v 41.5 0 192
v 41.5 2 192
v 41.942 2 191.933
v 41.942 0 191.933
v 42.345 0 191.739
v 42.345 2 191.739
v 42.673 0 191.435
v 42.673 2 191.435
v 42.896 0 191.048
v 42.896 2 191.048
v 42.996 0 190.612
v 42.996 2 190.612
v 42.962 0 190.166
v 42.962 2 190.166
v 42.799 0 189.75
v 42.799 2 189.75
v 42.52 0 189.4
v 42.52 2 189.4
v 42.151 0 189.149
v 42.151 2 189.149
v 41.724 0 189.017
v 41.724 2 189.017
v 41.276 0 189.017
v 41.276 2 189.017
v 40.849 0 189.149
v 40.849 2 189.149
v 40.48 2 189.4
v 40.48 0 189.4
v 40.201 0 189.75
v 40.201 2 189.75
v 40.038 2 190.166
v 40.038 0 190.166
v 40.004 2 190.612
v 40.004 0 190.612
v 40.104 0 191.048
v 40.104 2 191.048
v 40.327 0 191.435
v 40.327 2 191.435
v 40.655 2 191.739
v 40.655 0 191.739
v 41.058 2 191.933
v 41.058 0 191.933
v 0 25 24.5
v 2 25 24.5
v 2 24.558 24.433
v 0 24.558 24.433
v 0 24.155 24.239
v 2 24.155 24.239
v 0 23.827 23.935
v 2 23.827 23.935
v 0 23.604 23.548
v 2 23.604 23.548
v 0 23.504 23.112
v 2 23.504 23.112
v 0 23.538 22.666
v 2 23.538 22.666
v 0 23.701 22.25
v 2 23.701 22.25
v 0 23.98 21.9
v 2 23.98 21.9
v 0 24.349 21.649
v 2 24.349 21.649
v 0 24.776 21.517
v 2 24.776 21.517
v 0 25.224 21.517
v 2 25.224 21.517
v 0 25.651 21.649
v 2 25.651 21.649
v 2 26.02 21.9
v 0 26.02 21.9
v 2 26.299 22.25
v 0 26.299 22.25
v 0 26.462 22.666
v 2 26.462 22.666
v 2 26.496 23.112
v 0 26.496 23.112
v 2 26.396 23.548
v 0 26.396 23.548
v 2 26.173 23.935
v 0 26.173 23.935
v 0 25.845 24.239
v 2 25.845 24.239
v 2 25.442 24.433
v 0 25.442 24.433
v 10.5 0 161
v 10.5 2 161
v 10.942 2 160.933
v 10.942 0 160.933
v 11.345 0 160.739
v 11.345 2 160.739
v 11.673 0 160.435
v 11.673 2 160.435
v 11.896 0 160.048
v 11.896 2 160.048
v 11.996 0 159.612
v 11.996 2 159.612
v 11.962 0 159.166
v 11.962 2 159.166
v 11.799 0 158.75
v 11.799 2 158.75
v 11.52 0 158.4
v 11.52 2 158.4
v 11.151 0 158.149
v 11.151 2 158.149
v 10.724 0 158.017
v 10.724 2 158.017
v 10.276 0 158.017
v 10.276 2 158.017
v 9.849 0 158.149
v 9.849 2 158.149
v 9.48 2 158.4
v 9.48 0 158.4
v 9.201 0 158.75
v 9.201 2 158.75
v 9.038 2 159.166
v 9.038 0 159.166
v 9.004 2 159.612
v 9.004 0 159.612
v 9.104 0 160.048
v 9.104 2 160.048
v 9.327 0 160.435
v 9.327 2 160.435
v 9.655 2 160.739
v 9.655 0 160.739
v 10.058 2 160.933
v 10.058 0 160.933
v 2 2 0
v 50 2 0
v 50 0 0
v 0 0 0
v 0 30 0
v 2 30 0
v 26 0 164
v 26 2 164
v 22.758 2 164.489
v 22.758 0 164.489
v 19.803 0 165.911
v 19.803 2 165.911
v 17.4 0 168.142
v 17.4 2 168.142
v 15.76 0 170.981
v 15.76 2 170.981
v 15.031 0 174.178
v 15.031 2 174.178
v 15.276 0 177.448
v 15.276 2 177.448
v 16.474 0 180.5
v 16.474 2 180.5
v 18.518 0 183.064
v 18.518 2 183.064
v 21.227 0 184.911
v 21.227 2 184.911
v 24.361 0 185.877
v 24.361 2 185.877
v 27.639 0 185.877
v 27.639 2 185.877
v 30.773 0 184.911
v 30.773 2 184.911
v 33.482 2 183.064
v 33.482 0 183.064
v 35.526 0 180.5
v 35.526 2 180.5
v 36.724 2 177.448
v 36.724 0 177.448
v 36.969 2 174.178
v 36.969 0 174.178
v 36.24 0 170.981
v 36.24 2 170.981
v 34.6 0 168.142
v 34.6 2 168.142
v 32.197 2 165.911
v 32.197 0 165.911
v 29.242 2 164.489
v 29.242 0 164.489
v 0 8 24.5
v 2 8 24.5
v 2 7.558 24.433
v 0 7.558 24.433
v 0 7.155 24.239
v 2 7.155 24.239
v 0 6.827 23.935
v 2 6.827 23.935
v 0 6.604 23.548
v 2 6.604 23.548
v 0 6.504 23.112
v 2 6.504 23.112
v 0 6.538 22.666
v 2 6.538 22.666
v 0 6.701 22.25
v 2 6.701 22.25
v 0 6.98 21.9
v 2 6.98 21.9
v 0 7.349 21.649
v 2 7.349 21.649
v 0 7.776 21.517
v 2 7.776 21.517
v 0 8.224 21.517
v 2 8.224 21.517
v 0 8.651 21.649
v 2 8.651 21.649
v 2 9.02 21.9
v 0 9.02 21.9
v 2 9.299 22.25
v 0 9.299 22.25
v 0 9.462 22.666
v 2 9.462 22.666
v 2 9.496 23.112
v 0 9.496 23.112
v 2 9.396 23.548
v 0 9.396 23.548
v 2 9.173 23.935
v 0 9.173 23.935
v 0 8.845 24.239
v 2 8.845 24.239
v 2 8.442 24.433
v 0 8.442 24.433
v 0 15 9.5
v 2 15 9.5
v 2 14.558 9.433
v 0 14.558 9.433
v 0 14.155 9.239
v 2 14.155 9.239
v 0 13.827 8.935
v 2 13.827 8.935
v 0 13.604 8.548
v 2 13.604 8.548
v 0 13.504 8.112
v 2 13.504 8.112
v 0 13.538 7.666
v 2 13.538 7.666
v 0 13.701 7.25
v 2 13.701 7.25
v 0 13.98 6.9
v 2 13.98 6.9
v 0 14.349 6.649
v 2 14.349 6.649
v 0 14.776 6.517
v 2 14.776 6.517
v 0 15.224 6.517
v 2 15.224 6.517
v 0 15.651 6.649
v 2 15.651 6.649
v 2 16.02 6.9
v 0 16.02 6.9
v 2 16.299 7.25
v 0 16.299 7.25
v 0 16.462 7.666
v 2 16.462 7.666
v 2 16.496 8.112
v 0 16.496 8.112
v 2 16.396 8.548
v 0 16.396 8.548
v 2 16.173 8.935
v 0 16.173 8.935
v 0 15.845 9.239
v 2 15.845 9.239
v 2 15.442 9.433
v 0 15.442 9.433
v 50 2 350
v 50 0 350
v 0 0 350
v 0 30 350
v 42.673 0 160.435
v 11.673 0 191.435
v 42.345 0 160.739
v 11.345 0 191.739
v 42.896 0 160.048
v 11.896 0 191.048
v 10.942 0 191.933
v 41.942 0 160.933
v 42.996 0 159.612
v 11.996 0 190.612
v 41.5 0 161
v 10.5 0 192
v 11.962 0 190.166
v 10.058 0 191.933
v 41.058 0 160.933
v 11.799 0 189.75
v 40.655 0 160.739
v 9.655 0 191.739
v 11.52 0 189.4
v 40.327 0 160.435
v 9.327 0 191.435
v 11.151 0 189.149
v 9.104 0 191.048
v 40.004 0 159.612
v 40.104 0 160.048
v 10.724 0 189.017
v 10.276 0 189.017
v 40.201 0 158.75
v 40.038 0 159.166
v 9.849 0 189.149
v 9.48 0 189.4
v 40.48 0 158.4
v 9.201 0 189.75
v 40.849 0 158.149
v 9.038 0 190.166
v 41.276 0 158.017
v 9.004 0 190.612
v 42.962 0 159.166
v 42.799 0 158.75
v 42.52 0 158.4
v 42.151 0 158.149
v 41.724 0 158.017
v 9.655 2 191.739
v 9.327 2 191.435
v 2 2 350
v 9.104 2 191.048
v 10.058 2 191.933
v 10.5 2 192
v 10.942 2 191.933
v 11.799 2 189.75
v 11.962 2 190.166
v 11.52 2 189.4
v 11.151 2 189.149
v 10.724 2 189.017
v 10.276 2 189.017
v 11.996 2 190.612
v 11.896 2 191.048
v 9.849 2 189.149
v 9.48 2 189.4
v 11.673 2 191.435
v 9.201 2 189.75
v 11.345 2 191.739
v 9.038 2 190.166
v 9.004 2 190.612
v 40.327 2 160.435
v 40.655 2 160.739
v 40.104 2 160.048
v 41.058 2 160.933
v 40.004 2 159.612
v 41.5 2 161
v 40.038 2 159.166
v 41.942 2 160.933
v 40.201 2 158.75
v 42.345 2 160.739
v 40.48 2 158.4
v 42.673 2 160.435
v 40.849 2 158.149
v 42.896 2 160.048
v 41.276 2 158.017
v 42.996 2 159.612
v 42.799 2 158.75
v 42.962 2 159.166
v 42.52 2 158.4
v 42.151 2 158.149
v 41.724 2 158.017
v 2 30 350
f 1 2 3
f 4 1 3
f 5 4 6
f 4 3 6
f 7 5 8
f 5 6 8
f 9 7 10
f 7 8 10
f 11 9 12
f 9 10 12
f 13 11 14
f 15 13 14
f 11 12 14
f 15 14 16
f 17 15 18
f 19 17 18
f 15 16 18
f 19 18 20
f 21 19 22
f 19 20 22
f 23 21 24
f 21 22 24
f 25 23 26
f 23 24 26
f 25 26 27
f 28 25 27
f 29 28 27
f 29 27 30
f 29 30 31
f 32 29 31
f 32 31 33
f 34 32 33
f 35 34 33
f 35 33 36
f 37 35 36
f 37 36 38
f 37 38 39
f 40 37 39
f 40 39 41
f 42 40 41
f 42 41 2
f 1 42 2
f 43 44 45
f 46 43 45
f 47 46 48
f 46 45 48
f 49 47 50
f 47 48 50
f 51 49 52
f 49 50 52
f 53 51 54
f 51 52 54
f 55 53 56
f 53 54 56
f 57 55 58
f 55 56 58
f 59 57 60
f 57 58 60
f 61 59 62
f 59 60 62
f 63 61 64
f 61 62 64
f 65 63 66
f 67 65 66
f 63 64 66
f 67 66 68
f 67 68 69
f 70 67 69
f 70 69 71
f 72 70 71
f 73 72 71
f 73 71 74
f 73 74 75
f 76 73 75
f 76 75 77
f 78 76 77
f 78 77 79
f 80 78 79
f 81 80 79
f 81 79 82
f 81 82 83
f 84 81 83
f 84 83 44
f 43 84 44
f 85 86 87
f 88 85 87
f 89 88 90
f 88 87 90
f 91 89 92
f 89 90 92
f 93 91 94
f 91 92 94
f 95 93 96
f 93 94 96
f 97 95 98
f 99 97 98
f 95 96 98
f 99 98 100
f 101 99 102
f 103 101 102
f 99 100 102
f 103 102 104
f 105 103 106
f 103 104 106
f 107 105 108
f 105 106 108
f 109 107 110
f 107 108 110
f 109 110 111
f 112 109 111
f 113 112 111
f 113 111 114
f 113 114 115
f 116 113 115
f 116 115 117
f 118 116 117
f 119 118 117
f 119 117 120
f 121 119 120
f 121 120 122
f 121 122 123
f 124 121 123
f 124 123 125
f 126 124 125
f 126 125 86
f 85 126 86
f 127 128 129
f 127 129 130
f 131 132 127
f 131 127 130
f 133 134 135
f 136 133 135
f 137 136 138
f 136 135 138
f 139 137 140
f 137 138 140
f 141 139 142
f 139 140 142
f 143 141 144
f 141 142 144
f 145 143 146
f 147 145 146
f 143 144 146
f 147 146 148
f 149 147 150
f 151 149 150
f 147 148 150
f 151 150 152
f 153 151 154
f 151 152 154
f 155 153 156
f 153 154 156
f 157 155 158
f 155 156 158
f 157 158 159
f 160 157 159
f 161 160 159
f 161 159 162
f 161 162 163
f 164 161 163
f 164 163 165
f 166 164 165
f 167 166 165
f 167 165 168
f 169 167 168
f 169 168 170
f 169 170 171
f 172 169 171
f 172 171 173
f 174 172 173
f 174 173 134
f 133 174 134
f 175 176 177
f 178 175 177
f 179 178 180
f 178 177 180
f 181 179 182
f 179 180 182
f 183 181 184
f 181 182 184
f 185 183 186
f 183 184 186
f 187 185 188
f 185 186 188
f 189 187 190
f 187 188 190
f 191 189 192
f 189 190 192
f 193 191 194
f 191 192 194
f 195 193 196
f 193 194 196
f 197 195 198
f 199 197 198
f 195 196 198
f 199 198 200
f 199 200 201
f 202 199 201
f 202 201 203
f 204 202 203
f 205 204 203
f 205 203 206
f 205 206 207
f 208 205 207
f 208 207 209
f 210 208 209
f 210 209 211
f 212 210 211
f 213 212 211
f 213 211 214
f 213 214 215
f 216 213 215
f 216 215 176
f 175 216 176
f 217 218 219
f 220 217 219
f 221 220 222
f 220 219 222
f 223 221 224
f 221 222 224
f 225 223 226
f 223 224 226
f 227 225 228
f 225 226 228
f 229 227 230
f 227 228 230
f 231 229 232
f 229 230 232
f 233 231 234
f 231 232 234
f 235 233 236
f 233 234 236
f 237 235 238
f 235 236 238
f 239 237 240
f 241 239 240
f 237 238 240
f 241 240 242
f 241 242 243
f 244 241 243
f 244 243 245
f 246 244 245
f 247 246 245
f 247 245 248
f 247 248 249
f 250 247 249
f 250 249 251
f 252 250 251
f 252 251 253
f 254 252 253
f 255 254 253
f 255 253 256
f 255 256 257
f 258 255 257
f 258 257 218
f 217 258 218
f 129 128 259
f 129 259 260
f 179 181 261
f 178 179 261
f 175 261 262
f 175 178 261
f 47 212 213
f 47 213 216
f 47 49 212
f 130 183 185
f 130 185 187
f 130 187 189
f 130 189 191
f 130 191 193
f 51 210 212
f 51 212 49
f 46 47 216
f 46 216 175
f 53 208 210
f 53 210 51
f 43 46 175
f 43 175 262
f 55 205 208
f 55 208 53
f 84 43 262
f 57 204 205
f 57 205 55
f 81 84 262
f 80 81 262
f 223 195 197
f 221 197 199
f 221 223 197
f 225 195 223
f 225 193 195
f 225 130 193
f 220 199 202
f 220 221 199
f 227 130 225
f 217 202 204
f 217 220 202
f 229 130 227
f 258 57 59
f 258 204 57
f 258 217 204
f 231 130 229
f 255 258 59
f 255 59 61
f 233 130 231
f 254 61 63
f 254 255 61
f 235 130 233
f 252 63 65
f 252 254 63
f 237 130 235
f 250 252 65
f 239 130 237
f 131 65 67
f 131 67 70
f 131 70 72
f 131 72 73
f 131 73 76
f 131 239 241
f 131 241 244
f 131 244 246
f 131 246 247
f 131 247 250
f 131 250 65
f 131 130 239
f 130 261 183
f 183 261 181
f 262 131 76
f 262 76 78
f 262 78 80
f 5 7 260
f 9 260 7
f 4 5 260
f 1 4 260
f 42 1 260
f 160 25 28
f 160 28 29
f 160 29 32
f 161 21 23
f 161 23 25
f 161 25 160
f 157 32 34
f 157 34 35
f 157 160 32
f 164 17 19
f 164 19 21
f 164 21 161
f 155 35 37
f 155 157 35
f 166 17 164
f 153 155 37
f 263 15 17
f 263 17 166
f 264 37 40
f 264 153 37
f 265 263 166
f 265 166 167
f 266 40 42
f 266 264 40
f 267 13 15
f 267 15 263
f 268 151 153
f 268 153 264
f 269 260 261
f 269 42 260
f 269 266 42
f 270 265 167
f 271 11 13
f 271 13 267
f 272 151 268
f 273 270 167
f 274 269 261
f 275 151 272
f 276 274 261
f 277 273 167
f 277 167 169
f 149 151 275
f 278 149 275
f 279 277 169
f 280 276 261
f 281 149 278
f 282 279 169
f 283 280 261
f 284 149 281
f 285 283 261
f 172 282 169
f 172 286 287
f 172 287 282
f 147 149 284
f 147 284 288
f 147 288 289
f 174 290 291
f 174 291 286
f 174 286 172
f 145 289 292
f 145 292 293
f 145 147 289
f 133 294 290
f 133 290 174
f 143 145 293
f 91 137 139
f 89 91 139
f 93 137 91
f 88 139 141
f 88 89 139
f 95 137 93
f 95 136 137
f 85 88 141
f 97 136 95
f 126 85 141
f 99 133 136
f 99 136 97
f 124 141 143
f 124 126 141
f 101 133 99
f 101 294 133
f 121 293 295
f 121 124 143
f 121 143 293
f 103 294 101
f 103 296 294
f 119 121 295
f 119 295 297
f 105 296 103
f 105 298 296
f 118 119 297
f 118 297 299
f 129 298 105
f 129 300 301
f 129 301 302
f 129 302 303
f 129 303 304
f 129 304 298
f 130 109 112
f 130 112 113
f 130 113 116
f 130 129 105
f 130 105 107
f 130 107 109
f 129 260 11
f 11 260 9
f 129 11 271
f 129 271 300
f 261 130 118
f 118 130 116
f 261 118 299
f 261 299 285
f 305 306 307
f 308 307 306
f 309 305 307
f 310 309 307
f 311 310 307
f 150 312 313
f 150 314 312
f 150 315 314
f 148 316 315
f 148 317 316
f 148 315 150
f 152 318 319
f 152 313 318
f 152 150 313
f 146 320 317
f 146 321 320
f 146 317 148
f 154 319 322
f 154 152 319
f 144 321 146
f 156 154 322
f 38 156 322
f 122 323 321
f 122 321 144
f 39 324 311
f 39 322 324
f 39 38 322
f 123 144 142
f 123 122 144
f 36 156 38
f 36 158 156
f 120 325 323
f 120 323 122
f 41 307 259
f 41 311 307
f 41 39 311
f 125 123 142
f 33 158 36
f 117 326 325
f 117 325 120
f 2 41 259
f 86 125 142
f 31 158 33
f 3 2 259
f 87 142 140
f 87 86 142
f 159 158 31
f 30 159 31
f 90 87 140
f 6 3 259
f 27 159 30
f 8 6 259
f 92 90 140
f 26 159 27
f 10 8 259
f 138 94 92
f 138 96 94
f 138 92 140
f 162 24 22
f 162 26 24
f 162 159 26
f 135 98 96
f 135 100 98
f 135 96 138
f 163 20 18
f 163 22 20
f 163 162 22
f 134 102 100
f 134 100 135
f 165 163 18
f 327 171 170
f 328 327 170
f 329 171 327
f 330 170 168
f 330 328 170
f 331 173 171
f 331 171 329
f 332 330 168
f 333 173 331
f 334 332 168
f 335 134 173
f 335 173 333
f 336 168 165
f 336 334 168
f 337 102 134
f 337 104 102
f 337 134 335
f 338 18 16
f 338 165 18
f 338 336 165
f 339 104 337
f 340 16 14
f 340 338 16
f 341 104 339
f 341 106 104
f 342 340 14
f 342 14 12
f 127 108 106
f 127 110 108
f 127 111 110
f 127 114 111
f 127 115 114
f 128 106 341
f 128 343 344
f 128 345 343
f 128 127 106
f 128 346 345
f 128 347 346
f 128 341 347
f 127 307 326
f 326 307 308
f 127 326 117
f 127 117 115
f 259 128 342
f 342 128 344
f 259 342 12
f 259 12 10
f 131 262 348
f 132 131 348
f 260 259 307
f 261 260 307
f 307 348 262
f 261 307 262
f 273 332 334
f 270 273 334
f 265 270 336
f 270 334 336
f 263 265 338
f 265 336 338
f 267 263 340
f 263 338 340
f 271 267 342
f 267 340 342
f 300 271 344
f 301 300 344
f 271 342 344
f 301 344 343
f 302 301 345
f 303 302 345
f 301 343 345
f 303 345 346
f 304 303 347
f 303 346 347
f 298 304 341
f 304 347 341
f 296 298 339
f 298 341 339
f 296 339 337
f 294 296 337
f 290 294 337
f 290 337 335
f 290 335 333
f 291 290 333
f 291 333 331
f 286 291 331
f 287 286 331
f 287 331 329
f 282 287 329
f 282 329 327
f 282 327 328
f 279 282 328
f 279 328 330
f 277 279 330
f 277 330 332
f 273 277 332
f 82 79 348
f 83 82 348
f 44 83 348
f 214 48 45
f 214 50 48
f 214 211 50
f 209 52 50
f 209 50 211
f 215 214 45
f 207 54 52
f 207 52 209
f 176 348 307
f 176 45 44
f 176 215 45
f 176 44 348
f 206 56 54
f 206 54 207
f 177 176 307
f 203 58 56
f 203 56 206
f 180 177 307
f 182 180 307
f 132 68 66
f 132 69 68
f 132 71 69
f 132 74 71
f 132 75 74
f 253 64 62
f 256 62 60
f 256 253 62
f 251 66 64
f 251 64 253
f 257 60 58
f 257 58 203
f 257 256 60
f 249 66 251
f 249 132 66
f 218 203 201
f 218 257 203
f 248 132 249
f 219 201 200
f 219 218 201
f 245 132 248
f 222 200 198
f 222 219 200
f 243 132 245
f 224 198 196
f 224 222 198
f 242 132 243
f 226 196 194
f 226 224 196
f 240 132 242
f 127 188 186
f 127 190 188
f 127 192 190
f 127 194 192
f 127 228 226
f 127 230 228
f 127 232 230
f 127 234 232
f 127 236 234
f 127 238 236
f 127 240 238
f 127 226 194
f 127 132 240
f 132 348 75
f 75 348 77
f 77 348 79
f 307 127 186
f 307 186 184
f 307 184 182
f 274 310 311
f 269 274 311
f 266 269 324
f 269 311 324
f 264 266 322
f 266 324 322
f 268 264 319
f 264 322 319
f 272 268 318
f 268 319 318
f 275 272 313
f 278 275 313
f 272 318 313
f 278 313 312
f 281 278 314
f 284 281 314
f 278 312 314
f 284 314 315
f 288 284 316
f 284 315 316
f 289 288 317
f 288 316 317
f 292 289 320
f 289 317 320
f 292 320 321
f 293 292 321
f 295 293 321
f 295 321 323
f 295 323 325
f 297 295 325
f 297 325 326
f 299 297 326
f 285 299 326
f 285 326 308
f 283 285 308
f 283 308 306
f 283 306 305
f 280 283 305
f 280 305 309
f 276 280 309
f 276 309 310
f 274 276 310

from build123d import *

# Parameters (mm, degrees)
BOSS_EXTRUDE1_DEPTH      = 350
SKETCH7_R                = 10.999999996
CUT_EXTRUDE1_DEPTH       = 355.660400947
SKETCH8_R                = 1.499999996
CUT_EXTRUDE2_DEPTH       = 355.660400947
F_3_0_3_DIAMETER_HOLE1_D = 3


with BuildPart() as part:
    # Sketch1 → Boss-Extrude1 (new body)
    with BuildSketch(Plane.XY):
        Polygon((0, 0), (0, 30), (2, 30), (2, 2), (50, 2), (50, 0), align=None)
    extrude(amount=BOSS_EXTRUDE1_DEPTH)

    # Sketch7 → Cut-Extrude1 (cut, through all)
    with BuildSketch(Plane(origin=(0, 2, 0), x_dir=(1, 0, 0), z_dir=(0, 1, 0))):
        with Locations(Location((26, -175, 0), (0, 0, 90))):
            Circle(SKETCH7_R)
    extrude(amount=-CUT_EXTRUDE1_DEPTH, mode=Mode.SUBTRACT)

    # Sketch8 → Cut-Extrude2 (cut, through all)
    with BuildSketch(Plane(origin=(0, 2, 0), x_dir=(1, 0, 0), z_dir=(0, 1, 0))):
        with Locations(Location((41.5, -190.5, 0), (0, 0, 270))):
            Circle(SKETCH8_R)
        with Locations(Location((41.5, -159.5, 0), (0, 0, 270))):
            Circle(SKETCH8_R)
        with Locations(Location((10.5, -190.5, 0), (0, 0, 270))):
            Circle(SKETCH8_R)
        with Locations(Location((10.5, -159.5, 0), (0, 0, 270))):
            Circle(SKETCH8_R)
    extrude(amount=-CUT_EXTRUDE2_DEPTH, mode=Mode.SUBTRACT)

    # Ø3.0 (3) Diameter Hole1 (through all)
    with Locations(Plane(origin=(0, 182.32004832, 128.861996081), x_dir=(0, 0, -1), z_dir=(-1, 0, 0))):
        with Locations((105.861996081, 174.32004832), (105.861996081, 157.32004832), (120.861996081, 167.32004832)):
            Hole(F_3_0_3_DIAMETER_HOLE1_D / 2)


solid = part.part
